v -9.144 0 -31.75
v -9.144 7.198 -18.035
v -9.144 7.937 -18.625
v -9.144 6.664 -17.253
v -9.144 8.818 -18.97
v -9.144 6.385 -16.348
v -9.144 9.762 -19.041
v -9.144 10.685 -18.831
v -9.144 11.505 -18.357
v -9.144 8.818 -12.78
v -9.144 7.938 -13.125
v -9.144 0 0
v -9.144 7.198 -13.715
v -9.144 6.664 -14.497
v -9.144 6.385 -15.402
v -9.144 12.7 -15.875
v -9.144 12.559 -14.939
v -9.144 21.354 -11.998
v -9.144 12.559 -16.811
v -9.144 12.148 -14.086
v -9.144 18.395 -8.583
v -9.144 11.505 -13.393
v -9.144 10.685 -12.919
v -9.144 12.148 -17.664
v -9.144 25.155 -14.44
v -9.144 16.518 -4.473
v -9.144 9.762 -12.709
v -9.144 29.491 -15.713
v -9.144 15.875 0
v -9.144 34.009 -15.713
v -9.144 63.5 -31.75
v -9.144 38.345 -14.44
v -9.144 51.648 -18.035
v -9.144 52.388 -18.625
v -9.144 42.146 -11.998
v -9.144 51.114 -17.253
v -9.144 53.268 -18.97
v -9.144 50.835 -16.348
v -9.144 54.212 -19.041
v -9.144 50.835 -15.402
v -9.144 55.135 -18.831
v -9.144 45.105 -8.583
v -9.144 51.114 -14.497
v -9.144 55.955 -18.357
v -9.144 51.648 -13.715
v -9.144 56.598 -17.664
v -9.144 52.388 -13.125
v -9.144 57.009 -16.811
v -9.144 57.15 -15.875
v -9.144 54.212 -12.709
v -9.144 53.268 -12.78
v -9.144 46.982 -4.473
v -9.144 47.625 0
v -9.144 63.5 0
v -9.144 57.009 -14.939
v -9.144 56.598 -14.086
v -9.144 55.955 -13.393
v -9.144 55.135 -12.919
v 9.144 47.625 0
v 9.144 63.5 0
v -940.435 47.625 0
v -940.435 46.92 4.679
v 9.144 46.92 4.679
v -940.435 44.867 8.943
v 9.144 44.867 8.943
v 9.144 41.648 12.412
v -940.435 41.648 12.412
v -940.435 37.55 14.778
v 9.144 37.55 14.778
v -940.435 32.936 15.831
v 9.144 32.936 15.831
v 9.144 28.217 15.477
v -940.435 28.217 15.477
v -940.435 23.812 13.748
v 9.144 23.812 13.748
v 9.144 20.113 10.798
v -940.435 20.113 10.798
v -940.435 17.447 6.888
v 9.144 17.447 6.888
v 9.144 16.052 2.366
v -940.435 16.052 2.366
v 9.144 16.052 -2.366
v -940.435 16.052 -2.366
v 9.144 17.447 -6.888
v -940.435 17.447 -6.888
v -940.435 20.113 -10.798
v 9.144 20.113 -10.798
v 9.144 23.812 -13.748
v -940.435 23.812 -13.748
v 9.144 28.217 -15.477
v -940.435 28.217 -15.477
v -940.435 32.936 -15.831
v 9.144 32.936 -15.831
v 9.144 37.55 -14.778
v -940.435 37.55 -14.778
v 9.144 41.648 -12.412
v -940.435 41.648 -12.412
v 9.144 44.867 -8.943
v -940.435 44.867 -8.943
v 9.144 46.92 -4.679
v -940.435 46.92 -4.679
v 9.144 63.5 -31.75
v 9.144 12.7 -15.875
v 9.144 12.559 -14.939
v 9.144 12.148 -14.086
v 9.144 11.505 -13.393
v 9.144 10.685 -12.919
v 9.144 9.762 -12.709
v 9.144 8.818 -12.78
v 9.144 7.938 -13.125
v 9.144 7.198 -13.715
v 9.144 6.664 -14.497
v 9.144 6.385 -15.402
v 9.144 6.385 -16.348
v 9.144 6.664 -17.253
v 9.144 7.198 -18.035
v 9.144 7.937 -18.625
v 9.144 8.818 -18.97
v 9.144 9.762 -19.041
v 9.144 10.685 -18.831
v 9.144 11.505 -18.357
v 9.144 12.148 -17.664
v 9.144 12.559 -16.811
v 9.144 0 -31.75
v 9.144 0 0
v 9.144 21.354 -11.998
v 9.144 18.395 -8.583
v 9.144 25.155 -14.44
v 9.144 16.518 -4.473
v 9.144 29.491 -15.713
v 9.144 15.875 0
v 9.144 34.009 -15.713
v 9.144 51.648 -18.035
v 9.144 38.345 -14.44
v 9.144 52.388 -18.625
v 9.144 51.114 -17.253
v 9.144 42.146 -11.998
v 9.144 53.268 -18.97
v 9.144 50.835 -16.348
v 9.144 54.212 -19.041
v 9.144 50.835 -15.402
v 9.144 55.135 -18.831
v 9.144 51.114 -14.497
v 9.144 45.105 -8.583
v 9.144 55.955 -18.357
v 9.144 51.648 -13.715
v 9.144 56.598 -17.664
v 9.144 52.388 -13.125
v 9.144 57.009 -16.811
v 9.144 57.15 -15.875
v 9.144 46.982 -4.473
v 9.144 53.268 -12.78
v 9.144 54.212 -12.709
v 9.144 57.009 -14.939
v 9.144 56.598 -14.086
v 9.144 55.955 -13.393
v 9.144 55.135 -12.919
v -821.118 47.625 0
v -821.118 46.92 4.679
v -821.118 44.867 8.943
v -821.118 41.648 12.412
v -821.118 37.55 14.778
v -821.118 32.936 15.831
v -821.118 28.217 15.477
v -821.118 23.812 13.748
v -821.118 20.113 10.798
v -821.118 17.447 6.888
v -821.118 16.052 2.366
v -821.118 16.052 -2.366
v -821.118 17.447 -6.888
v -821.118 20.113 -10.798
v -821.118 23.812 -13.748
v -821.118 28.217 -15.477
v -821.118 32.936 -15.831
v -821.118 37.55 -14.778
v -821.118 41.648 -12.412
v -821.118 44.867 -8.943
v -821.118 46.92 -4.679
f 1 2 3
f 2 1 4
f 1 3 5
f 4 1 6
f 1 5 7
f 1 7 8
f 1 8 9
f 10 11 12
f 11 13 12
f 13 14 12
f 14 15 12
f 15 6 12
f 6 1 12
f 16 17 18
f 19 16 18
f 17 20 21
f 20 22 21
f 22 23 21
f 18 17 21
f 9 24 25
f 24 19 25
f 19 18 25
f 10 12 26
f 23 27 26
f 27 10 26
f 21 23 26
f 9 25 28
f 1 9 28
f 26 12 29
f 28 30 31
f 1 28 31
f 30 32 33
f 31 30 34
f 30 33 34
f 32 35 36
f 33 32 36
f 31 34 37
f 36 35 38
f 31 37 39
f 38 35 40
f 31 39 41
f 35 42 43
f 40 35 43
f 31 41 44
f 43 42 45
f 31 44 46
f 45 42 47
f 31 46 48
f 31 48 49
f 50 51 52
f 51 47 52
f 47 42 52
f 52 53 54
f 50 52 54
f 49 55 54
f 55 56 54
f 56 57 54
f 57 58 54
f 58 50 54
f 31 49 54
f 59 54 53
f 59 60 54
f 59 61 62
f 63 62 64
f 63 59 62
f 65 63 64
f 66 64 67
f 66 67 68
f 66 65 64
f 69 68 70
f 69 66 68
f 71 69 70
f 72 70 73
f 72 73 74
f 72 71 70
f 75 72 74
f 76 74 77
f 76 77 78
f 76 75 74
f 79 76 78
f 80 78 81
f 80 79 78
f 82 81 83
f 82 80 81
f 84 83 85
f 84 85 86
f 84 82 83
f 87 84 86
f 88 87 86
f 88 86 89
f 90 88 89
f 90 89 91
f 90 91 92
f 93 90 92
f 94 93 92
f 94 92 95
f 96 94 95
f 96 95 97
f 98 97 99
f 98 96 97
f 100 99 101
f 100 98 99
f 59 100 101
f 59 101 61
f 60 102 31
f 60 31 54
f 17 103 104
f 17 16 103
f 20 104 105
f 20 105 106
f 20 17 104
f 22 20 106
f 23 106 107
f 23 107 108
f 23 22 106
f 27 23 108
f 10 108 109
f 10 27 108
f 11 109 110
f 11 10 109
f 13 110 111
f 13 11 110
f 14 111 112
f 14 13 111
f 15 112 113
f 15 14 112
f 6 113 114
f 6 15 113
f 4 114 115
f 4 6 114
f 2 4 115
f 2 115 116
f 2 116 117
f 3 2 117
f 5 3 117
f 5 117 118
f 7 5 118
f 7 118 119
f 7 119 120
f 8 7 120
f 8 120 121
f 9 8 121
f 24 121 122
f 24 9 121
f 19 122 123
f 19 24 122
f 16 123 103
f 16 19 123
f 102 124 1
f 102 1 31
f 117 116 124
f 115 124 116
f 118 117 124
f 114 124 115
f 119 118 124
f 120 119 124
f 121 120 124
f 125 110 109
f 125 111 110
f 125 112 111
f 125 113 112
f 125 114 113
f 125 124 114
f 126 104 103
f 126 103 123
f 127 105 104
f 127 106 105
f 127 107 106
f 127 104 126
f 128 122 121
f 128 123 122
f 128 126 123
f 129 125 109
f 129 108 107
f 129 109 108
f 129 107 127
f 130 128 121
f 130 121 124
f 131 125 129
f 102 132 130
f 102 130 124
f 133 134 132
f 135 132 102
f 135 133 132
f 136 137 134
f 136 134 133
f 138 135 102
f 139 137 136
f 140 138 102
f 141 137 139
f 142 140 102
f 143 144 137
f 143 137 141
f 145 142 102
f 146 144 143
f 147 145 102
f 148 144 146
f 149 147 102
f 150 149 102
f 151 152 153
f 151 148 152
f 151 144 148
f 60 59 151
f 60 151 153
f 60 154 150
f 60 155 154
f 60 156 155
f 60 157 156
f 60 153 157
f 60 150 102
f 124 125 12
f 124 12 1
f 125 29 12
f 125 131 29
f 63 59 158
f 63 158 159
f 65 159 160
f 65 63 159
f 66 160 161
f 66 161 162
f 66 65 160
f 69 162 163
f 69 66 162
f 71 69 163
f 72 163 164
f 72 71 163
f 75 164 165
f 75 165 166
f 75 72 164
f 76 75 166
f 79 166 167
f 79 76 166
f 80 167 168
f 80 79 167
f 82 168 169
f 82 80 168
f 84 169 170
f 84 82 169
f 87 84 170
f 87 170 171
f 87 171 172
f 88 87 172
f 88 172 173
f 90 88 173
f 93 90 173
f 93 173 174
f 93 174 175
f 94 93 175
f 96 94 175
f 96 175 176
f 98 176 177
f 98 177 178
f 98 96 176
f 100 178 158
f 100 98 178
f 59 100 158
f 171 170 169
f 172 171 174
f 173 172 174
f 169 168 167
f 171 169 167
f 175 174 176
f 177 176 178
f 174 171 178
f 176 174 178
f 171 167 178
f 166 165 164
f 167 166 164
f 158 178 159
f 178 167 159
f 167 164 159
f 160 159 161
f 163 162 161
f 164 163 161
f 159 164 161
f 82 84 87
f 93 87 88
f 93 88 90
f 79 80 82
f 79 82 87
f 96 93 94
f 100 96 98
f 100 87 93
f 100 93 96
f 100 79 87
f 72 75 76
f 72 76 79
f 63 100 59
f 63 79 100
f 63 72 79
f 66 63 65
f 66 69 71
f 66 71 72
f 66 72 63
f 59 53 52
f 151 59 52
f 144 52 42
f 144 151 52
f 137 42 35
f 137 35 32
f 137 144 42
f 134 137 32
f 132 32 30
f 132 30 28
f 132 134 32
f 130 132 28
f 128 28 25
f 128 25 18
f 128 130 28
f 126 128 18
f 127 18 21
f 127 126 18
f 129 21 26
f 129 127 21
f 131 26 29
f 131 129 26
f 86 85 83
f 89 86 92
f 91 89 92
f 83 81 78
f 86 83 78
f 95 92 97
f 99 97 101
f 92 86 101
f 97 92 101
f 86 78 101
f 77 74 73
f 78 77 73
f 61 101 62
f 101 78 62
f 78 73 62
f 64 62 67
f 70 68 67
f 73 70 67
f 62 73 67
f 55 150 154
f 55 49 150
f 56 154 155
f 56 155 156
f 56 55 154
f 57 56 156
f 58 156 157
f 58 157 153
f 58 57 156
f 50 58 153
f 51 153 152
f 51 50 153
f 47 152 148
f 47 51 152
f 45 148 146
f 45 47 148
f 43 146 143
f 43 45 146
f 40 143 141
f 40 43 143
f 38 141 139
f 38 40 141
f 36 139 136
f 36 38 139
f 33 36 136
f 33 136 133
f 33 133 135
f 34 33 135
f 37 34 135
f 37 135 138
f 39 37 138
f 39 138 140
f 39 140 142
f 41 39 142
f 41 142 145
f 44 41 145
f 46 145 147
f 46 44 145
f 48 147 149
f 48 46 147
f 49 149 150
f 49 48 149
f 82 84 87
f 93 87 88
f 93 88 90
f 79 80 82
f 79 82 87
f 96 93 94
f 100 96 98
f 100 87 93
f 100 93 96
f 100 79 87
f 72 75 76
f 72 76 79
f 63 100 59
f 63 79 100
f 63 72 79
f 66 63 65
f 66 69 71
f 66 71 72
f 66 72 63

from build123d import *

# Parameters (mm, degrees)
F0_R     = 3.175
F1_DEPTH = 9.144
F3_DEPTH = 830.2625
F5_DEPTH = 949.579


with BuildPart() as f1:
    # F0 (on Right) → F1 (new body, symmetric)
    with BuildSketch(Plane.YZ):
        with BuildLine():
            Line((15.875, 0), (0, 0))
            Line((0, 0), (0, -31.75))
            Line((0, -31.75), (63.5, -31.75))
            Line((63.5, -31.75), (63.5, 0))
            Line((63.5, 0), (47.625, 0))
            ThreePointArc((47.625, 0), (31.75, -15.875), (15.875, 0))
        make_face()
        with Locations((9.525, -15.875)):
            Circle(F0_R, mode=Mode.SUBTRACT)
        with Locations((53.975, -15.875)):
            Circle(F0_R, mode=Mode.SUBTRACT)
    extrude(amount=F1_DEPTH, both=True)


with BuildPart() as f3:
    # F2 (on face) → F3 (new body)
    with BuildSketch(Plane.YZ.offset(9.144)):
        with BuildLine():
            ThreePointArc((15.875, 0), (31.75, -15.875), (47.625, 0))
            ThreePointArc((47.625, 0), (31.75, 15.875), (15.875, 0))
        make_face()
    extrude(amount=-F3_DEPTH)


with BuildPart() as f5:
    # F4 (on face) → F5 (new body)
    with BuildSketch(Plane.YZ.offset(9.144)):
        with BuildLine():
            ThreePointArc((15.875, 0), (31.75, -15.875), (47.625, 0))
            ThreePointArc((47.625, 0), (31.75, 15.875), (15.875, 0))
        make_face()
    extrude(amount=-F5_DEPTH)


solid = Compound([f1.part, f3.part, f5.part])
